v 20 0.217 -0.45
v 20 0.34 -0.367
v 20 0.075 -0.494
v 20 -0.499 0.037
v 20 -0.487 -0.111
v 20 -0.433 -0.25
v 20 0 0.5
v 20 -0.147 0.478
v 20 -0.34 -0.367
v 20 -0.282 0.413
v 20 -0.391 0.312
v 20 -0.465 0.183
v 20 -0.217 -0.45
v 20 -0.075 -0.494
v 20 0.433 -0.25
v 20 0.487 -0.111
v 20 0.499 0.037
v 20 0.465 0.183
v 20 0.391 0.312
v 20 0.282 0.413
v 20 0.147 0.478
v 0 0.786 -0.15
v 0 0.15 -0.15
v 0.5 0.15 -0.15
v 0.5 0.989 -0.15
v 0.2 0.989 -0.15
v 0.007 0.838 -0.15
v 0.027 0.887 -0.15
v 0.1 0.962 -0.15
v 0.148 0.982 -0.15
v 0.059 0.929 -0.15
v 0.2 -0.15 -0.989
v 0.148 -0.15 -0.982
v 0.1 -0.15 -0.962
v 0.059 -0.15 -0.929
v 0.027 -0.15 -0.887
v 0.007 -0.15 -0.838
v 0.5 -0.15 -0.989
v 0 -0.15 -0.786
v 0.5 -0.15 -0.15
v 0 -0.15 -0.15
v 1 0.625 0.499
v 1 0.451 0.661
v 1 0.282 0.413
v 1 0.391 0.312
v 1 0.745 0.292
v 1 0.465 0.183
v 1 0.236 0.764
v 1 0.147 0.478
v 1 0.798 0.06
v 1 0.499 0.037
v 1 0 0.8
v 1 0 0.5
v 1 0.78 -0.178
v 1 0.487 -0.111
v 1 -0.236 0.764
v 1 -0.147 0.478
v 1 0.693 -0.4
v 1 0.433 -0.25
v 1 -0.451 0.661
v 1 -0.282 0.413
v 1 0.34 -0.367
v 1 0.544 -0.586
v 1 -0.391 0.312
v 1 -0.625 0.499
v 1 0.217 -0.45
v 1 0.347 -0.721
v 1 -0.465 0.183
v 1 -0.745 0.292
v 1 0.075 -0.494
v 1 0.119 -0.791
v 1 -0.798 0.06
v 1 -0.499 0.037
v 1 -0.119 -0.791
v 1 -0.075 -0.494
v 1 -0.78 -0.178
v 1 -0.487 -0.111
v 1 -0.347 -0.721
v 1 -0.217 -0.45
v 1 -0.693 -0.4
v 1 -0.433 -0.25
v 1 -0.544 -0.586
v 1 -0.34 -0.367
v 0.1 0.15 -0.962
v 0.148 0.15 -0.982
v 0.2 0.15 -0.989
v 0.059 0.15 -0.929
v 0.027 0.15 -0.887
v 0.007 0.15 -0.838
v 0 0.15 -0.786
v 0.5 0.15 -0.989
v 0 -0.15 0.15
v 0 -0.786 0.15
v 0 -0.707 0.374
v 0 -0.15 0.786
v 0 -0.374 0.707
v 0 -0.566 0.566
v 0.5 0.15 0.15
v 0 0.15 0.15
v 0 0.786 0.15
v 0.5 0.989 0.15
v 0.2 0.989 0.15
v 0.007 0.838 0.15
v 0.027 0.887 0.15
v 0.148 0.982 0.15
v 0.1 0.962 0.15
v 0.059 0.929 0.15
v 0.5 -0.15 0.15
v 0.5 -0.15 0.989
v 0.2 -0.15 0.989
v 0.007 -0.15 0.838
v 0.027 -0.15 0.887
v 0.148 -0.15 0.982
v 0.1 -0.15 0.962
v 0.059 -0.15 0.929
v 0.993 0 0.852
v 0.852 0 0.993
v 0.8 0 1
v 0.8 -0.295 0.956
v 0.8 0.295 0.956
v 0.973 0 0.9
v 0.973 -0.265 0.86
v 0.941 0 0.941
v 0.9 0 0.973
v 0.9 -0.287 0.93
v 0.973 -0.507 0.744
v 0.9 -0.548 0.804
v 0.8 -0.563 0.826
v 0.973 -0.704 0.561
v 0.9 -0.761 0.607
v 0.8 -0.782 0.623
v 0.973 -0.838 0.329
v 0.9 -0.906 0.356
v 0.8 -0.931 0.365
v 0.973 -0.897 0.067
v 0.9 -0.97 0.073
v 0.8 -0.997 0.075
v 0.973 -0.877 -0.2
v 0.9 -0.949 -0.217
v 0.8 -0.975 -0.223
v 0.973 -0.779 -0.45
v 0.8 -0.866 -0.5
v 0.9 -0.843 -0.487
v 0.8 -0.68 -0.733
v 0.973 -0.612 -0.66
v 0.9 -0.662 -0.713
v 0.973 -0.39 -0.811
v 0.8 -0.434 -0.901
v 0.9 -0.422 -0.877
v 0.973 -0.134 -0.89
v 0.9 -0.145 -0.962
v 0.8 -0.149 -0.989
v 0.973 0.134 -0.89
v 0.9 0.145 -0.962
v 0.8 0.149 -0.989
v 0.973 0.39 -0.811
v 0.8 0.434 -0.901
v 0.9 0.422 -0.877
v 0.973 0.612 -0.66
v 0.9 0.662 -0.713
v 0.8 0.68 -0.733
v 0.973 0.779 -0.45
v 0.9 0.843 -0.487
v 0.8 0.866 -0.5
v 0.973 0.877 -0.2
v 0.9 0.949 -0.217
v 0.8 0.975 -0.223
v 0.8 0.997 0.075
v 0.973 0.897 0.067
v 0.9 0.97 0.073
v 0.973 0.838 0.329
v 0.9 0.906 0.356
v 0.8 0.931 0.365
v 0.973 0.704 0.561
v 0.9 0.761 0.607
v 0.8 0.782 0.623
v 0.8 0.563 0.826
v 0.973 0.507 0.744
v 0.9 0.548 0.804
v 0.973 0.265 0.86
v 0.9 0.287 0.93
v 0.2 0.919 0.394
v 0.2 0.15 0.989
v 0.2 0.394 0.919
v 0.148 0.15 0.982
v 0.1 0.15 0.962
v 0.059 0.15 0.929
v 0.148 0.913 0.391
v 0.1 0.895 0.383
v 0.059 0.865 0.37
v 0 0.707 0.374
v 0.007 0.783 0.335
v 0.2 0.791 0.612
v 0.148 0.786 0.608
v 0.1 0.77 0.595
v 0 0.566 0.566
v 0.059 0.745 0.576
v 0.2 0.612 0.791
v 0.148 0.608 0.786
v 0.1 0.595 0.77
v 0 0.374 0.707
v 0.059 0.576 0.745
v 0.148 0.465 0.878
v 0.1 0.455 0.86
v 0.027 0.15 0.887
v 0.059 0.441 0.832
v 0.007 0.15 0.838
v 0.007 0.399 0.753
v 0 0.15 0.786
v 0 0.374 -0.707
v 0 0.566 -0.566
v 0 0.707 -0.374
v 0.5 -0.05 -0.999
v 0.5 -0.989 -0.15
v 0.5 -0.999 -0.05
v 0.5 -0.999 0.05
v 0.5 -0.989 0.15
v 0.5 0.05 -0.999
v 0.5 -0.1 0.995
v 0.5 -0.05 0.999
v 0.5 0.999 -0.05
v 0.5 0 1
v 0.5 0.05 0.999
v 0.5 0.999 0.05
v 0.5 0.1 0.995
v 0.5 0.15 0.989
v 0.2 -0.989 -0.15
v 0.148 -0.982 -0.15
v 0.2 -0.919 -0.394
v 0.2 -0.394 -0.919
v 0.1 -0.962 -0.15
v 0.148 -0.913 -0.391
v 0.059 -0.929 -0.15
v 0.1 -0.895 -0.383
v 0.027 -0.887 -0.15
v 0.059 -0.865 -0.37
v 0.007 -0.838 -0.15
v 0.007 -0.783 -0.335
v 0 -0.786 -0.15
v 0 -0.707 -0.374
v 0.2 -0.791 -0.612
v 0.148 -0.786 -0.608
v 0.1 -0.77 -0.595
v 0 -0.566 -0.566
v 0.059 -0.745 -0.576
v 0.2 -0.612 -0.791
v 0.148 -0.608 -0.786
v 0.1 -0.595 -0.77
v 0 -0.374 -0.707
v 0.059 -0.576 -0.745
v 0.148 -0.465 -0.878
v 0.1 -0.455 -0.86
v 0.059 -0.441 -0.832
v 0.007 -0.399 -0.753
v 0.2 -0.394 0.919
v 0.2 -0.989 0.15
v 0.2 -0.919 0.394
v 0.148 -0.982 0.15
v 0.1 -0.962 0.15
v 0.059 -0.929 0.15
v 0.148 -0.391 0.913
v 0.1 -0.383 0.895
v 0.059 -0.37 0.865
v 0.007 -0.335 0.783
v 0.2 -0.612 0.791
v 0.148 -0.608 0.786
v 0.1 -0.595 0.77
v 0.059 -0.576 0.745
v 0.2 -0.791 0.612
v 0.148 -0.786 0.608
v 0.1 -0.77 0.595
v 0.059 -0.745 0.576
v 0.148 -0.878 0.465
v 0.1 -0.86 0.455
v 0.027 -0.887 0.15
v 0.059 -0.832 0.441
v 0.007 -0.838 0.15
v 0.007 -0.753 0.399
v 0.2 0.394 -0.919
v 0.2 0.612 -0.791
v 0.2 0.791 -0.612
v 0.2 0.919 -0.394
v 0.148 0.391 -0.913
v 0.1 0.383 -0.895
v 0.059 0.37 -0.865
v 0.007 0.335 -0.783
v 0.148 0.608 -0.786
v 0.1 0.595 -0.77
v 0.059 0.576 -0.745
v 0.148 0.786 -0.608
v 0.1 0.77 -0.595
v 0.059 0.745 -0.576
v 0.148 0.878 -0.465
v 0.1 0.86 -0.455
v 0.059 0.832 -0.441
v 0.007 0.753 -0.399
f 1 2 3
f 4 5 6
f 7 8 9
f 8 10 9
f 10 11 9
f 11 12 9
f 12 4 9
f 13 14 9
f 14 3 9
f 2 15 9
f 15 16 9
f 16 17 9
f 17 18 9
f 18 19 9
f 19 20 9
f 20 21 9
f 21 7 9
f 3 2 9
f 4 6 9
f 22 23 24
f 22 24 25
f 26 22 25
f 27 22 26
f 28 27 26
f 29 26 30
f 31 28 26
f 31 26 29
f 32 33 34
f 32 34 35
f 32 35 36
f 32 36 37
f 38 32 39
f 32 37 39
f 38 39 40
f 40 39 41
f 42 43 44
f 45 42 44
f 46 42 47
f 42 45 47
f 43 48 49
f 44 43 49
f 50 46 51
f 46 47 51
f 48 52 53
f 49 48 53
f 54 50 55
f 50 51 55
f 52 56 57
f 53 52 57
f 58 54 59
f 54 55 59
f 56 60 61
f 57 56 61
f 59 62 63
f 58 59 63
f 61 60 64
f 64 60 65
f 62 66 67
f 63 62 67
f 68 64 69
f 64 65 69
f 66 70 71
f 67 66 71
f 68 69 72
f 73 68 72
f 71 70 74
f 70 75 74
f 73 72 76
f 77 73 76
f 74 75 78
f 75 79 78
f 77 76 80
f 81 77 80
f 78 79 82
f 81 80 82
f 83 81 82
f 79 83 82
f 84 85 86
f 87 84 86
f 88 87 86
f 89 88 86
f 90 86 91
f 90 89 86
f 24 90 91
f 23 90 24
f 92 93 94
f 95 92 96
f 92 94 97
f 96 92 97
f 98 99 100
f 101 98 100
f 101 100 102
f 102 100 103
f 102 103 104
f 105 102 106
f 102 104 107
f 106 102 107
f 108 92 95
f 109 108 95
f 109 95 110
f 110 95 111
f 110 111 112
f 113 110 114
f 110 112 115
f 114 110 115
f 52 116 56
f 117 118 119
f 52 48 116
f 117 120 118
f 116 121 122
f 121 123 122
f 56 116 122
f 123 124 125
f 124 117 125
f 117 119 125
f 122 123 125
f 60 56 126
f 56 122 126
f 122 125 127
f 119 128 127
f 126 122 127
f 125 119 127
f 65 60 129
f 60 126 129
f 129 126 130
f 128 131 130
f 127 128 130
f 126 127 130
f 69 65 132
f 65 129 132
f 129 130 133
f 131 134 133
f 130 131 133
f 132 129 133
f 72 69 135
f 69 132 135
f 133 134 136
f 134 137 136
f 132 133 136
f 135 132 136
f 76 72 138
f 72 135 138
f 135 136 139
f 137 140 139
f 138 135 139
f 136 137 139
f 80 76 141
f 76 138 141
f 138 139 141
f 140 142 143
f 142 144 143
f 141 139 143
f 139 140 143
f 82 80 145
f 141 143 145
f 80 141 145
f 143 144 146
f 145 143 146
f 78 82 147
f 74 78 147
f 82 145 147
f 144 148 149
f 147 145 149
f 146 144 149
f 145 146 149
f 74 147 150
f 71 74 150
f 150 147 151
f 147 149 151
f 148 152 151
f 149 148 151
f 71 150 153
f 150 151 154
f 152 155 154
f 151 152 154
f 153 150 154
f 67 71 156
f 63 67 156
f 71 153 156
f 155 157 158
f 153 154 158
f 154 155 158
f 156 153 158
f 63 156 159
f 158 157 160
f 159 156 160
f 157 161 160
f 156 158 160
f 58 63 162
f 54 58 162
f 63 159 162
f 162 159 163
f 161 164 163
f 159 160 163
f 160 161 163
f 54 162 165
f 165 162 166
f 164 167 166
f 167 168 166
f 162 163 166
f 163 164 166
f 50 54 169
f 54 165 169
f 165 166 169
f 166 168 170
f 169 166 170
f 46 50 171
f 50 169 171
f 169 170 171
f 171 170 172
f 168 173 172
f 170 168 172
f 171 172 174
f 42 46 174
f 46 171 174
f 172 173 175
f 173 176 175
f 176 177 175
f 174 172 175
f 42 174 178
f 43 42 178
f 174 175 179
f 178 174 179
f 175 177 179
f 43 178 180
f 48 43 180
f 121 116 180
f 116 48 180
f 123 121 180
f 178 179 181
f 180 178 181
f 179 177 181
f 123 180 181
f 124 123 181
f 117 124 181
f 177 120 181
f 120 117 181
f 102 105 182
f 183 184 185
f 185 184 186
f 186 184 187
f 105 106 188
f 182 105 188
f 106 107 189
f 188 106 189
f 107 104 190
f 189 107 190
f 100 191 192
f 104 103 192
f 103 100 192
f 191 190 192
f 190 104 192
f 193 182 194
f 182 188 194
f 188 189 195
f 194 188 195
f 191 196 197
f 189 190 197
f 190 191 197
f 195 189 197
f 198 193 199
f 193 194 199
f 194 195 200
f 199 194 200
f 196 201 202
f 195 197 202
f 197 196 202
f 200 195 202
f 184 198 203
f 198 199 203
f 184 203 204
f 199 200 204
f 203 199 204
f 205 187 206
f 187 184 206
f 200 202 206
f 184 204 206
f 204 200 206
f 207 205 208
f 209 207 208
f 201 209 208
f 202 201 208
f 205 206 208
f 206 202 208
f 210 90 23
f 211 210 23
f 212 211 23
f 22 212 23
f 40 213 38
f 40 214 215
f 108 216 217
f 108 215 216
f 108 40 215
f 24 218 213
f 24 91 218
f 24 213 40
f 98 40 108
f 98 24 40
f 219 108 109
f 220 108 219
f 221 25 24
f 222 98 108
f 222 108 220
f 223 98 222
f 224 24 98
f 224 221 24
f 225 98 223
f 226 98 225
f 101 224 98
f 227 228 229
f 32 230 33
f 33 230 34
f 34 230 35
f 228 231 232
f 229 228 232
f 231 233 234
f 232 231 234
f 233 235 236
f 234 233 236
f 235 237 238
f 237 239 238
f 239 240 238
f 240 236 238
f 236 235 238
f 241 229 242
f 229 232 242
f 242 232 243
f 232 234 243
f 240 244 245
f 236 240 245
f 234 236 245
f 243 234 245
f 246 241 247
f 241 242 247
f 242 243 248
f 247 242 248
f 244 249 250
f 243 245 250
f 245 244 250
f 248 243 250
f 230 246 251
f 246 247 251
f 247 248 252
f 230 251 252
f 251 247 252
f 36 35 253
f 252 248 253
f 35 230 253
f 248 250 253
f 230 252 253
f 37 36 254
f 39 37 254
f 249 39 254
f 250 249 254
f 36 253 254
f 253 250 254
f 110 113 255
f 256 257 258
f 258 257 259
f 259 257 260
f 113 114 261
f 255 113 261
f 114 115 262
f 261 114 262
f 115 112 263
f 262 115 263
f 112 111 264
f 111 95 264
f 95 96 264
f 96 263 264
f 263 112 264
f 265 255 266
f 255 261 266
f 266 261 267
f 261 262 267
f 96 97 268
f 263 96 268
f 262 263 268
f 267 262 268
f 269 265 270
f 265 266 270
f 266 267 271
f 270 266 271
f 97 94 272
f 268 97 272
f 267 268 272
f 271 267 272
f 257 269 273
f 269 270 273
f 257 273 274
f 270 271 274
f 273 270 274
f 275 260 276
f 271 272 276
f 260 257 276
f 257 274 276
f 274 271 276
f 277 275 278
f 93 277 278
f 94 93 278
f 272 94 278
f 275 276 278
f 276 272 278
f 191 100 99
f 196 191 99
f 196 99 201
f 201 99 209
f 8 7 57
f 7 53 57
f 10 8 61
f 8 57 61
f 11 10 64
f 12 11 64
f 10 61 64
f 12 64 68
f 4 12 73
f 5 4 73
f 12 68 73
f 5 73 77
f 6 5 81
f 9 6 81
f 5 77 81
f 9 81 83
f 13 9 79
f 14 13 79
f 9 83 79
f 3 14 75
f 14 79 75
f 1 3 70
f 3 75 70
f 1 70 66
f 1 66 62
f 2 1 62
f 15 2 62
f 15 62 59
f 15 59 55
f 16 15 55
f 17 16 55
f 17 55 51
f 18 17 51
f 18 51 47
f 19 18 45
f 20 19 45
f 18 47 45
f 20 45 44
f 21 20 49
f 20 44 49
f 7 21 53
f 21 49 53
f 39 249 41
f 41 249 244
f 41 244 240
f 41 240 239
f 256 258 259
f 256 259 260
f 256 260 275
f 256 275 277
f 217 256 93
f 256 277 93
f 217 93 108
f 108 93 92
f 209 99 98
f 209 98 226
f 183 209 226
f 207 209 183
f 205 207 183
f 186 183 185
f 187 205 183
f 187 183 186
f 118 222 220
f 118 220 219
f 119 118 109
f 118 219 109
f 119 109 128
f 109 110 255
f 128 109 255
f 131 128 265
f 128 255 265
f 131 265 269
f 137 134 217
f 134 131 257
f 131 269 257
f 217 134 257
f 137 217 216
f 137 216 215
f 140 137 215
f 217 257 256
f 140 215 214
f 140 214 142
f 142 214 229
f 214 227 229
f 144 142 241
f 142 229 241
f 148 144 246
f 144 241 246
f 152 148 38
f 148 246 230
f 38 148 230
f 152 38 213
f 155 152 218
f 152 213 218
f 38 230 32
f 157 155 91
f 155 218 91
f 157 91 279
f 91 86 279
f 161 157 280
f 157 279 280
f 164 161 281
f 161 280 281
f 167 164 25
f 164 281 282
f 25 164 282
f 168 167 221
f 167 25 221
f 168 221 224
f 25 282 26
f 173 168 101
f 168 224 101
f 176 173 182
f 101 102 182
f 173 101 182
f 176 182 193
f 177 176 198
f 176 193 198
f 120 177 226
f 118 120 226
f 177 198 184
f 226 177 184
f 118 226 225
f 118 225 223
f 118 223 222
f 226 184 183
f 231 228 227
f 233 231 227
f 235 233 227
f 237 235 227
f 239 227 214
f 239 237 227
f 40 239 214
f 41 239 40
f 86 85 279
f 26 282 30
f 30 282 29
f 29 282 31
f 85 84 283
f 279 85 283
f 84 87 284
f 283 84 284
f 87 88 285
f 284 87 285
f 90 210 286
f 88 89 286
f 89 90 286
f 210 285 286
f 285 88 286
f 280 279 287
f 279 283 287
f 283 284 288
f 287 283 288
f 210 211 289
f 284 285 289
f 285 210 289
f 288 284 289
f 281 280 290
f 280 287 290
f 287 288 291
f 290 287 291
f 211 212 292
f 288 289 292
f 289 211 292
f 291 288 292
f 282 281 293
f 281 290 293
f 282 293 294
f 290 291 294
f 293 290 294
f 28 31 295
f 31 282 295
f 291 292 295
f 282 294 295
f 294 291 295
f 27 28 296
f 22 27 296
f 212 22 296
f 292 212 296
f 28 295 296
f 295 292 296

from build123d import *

# Parameters (mm, degrees)
SKETCH2_W          = 2
SKETCH2_H          = 0.3
SKETCH2_W_2        = 0.3
SKETCH2_H_2        = 2
CUT_EXTRUDE1_DEPTH = 0.5


with BuildPart() as part:
    # Sketch1 → Revolve1 (revolve)
    with BuildSketch(Plane.XY, mode=Mode.PRIVATE) as revolve1_sk:
        with BuildLine():
            Line((0, 0.8), (0, 0))
            Line((0, 0), (20, 0))
            Line((20, 0), (20, 0.5))
            Line((20, 0.5), (1, 0.5))
            Line((1, 0.5), (1, 0.8))
            ThreePointArc((1, 0.8), (0.941421356, 0.941421356), (0.8, 1))
            Line((0.8, 1), (0.2, 1))
            ThreePointArc((0.2, 1), (0.058578644, 0.941421356), (0, 0.8))
        make_face()
    revolve(revolve1_sk.sketch.rotate(Axis((0, 0, 0), (1, 0, 0)), 90), axis=Axis((0, 0, 0), (1, 0, 0)))

    # Sketch2 → Cut-Extrude1 (cut)
    with BuildSketch(Plane.ZY):
        Rectangle(SKETCH2_W, SKETCH2_H)
        Rectangle(SKETCH2_W_2, SKETCH2_H_2)
    extrude(amount=-CUT_EXTRUDE1_DEPTH, mode=Mode.SUBTRACT)


solid = part.part
